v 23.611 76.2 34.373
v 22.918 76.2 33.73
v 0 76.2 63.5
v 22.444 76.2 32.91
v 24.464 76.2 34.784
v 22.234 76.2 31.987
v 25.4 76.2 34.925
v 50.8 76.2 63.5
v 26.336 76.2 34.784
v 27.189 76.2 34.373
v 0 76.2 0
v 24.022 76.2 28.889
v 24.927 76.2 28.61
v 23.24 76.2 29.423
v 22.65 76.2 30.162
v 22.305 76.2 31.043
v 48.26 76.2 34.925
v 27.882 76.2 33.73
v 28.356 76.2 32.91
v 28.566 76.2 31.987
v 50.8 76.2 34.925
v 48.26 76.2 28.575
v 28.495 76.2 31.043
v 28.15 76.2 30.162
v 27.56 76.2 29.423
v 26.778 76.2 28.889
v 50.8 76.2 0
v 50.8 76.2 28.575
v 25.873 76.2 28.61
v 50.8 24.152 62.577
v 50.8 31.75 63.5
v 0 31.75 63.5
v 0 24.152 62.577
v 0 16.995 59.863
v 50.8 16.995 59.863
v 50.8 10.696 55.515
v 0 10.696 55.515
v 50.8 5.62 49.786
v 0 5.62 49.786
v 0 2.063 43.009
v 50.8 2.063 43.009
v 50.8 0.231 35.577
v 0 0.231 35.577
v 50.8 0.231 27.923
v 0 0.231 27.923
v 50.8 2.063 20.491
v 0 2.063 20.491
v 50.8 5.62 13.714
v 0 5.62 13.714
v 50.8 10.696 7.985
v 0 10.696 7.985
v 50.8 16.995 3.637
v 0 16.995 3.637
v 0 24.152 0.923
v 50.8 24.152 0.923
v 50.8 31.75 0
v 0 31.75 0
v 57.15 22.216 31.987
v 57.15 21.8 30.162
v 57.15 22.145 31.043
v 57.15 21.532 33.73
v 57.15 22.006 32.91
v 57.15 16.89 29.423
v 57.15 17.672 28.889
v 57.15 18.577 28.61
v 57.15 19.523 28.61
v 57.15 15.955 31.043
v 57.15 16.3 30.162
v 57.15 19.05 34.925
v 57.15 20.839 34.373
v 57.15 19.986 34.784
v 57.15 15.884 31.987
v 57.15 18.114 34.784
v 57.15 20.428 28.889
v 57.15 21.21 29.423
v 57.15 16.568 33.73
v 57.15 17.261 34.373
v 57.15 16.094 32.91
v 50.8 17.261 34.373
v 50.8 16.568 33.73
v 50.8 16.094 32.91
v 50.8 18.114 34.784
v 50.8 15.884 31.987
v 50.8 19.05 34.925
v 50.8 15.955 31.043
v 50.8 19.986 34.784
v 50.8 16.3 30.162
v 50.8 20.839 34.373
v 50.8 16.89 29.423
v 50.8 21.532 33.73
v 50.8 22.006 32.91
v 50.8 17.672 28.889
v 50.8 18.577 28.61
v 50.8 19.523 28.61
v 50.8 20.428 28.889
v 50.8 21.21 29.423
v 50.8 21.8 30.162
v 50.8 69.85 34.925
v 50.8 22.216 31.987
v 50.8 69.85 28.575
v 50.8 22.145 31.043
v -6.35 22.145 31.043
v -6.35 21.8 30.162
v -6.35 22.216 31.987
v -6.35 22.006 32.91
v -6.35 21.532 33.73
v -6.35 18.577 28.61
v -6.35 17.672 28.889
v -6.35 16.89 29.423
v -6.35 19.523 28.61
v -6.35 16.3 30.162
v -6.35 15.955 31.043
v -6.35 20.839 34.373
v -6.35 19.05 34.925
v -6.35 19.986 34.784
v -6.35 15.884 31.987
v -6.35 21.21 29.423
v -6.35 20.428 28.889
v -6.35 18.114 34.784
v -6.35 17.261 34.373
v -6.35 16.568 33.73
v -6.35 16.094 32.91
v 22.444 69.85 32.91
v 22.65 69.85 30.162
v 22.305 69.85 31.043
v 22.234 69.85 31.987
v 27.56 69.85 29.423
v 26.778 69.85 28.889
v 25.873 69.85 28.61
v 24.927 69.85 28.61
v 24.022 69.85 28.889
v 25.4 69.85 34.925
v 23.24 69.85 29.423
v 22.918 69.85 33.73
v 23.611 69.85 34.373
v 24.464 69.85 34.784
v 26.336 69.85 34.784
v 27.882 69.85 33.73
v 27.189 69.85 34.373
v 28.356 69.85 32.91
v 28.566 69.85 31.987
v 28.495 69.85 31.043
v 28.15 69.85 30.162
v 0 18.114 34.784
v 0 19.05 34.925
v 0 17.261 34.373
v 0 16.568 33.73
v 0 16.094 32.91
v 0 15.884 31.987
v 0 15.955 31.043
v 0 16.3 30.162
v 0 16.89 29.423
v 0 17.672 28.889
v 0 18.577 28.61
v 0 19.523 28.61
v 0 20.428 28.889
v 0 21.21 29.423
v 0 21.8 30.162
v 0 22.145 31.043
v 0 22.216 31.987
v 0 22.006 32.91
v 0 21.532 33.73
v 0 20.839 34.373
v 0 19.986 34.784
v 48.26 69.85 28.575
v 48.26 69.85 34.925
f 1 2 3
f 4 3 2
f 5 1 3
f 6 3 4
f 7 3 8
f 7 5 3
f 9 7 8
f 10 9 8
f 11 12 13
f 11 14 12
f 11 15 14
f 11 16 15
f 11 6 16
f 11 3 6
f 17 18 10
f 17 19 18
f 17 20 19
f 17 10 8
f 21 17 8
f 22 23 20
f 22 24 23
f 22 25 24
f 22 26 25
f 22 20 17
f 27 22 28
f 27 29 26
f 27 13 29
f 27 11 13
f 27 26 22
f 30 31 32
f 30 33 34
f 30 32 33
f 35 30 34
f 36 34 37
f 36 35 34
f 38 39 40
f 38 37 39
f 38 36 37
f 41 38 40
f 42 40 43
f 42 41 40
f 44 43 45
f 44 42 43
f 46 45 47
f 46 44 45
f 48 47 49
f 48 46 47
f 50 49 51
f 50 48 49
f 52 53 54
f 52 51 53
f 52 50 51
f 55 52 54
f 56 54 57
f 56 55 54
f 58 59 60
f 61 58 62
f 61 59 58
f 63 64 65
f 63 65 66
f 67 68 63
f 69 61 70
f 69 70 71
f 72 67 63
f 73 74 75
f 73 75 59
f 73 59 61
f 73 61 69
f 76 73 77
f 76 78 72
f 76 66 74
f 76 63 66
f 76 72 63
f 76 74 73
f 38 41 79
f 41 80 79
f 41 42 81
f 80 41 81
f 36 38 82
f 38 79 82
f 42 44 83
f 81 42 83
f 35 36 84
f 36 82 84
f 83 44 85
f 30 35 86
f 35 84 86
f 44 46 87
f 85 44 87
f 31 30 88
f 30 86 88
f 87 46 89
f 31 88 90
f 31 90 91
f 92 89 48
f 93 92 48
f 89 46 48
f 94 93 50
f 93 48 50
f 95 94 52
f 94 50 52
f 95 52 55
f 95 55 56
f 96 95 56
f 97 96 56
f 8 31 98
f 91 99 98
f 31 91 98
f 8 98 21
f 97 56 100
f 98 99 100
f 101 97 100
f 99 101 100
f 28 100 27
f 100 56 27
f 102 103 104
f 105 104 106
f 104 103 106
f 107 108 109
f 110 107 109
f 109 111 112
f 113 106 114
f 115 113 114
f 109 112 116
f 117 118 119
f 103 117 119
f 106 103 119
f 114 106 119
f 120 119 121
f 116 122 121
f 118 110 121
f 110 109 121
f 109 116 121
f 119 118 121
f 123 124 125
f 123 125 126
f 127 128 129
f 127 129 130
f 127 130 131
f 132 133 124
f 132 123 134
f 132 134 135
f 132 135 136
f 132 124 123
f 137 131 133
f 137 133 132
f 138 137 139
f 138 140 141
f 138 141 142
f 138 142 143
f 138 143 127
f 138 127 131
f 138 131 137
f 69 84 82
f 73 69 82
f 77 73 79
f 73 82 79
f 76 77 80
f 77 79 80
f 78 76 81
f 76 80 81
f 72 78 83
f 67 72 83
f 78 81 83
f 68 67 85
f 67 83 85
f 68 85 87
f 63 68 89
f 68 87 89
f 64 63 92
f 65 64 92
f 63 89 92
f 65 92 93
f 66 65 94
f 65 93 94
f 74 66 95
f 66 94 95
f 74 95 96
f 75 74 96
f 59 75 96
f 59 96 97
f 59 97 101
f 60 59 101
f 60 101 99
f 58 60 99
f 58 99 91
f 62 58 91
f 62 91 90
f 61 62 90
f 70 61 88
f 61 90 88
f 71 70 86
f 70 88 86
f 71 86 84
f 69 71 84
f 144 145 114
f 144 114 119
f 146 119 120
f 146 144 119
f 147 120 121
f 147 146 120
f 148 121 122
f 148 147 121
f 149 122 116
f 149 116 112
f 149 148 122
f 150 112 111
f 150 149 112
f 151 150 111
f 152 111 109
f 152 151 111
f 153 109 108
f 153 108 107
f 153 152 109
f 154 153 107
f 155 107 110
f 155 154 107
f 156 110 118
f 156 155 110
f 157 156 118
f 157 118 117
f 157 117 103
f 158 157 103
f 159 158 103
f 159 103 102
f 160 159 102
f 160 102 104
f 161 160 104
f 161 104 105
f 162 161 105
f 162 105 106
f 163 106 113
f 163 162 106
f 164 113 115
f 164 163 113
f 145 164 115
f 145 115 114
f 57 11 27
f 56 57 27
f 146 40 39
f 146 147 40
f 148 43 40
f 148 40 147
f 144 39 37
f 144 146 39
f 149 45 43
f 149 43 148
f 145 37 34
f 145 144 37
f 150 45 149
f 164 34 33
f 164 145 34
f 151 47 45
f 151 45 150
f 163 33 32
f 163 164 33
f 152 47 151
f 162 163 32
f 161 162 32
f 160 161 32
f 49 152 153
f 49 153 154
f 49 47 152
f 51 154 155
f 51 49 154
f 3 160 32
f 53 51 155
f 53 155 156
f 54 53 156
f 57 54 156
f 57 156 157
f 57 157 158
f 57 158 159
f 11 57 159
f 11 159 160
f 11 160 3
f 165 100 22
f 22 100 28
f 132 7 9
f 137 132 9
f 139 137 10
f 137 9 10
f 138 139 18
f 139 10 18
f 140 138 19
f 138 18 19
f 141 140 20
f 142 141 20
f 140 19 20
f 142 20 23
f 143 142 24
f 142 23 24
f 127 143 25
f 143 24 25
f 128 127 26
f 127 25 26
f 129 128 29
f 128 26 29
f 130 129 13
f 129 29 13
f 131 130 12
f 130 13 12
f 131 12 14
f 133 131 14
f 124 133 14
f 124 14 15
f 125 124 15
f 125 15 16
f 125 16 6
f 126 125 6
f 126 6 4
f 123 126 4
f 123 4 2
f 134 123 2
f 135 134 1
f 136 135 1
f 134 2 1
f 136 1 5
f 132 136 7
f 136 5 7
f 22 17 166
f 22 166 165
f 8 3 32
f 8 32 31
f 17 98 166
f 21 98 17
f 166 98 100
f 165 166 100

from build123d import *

# Parameters (mm, degrees)
SKETCH1_W           = 50.8
SKETCH1_H           = 76.2
BOSS_EXTRUDE1_DEPTH = 63.5
FILLET2_RADIUS      = 31.75
FILLET2_LENGTH      = 50.8
SKETCH2_R           = 3.175
BOSS_EXTRUDE2_DEPTH = 6.35
SKETCH3_R           = 3.175
CUT_EXTRUDE1_DEPTH  = 6.35
SKETCH4_W           = 6.35
SKETCH4_H           = 6.35
CUT_EXTRUDE2_DEPTH  = 2.54


with BuildPart() as part:
    # Sketch1 → Boss-Extrude1 (new body)
    with BuildSketch(Plane.XY):
        with Locations((25.4, 38.1)):
            Rectangle(SKETCH1_W, SKETCH1_H)
    extrude(amount=BOSS_EXTRUDE1_DEPTH)

    # Fillet2: full round fillet: the end face becomes a half cylinder, R = half its width
    fillet2_face = Plane((25.4, 0, 31.75), x_dir=(1, 0, 0), z_dir=(0, -1, 0))  # on the end face: x along it, z out of the body
    fillet2_slab = fillet2_face.offset(-FILLET2_RADIUS / 2) * Box(FILLET2_LENGTH, 2 * FILLET2_RADIUS, FILLET2_RADIUS, mode=Mode.PRIVATE)  # the body's end, R deep
    fillet2_round = Plane((25.4, 31.75, 31.75), x_dir=(0, -1, 0), z_dir=(1, 0, 0)) * Cylinder(FILLET2_RADIUS, FILLET2_LENGTH, mode=Mode.PRIVATE)  # its axis R under the face
    add(fillet2_slab - fillet2_round, mode=Mode.SUBTRACT)

    # Sketch2 → Boss-Extrude2 (add)
    with BuildSketch(Plane(origin=(50.8, 0, 0), x_dir=(0, 0, -1), z_dir=(1, 0, 0))):
        with Locations(Location((-31.75, 19.05, 0), (0, 0, 180))):
            Circle(SKETCH2_R)
    boss_extrude2 = extrude(amount=BOSS_EXTRUDE2_DEPTH)

    # Mirror1: Boss-Extrude2 across plane
    add(boss_extrude2.mirror(Plane(origin=(25.4, 0, 0), x_dir=(0, 0, 1), z_dir=(1, 0, 0))))

    # Sketch3 → Cut-Extrude1 (cut)
    with BuildSketch(Plane(origin=(0, 76.2, 0), x_dir=(1, 0, 0), z_dir=(0, 1, 0))):
        with Locations(Location((25.4, -31.75, 0), (0, 0, 270))):
            Circle(SKETCH3_R)
    extrude(amount=-CUT_EXTRUDE1_DEPTH, mode=Mode.SUBTRACT)

    # Sketch4 → Cut-Extrude2 (cut)
    with BuildSketch(Plane(origin=(50.8, 0, 0), x_dir=(0, 0, -1), z_dir=(1, 0, 0))):
        with Locations((-31.75, 73.025)):
            Rectangle(SKETCH4_W, SKETCH4_H)
    extrude(amount=-CUT_EXTRUDE2_DEPTH, mode=Mode.SUBTRACT)


solid = part.part
